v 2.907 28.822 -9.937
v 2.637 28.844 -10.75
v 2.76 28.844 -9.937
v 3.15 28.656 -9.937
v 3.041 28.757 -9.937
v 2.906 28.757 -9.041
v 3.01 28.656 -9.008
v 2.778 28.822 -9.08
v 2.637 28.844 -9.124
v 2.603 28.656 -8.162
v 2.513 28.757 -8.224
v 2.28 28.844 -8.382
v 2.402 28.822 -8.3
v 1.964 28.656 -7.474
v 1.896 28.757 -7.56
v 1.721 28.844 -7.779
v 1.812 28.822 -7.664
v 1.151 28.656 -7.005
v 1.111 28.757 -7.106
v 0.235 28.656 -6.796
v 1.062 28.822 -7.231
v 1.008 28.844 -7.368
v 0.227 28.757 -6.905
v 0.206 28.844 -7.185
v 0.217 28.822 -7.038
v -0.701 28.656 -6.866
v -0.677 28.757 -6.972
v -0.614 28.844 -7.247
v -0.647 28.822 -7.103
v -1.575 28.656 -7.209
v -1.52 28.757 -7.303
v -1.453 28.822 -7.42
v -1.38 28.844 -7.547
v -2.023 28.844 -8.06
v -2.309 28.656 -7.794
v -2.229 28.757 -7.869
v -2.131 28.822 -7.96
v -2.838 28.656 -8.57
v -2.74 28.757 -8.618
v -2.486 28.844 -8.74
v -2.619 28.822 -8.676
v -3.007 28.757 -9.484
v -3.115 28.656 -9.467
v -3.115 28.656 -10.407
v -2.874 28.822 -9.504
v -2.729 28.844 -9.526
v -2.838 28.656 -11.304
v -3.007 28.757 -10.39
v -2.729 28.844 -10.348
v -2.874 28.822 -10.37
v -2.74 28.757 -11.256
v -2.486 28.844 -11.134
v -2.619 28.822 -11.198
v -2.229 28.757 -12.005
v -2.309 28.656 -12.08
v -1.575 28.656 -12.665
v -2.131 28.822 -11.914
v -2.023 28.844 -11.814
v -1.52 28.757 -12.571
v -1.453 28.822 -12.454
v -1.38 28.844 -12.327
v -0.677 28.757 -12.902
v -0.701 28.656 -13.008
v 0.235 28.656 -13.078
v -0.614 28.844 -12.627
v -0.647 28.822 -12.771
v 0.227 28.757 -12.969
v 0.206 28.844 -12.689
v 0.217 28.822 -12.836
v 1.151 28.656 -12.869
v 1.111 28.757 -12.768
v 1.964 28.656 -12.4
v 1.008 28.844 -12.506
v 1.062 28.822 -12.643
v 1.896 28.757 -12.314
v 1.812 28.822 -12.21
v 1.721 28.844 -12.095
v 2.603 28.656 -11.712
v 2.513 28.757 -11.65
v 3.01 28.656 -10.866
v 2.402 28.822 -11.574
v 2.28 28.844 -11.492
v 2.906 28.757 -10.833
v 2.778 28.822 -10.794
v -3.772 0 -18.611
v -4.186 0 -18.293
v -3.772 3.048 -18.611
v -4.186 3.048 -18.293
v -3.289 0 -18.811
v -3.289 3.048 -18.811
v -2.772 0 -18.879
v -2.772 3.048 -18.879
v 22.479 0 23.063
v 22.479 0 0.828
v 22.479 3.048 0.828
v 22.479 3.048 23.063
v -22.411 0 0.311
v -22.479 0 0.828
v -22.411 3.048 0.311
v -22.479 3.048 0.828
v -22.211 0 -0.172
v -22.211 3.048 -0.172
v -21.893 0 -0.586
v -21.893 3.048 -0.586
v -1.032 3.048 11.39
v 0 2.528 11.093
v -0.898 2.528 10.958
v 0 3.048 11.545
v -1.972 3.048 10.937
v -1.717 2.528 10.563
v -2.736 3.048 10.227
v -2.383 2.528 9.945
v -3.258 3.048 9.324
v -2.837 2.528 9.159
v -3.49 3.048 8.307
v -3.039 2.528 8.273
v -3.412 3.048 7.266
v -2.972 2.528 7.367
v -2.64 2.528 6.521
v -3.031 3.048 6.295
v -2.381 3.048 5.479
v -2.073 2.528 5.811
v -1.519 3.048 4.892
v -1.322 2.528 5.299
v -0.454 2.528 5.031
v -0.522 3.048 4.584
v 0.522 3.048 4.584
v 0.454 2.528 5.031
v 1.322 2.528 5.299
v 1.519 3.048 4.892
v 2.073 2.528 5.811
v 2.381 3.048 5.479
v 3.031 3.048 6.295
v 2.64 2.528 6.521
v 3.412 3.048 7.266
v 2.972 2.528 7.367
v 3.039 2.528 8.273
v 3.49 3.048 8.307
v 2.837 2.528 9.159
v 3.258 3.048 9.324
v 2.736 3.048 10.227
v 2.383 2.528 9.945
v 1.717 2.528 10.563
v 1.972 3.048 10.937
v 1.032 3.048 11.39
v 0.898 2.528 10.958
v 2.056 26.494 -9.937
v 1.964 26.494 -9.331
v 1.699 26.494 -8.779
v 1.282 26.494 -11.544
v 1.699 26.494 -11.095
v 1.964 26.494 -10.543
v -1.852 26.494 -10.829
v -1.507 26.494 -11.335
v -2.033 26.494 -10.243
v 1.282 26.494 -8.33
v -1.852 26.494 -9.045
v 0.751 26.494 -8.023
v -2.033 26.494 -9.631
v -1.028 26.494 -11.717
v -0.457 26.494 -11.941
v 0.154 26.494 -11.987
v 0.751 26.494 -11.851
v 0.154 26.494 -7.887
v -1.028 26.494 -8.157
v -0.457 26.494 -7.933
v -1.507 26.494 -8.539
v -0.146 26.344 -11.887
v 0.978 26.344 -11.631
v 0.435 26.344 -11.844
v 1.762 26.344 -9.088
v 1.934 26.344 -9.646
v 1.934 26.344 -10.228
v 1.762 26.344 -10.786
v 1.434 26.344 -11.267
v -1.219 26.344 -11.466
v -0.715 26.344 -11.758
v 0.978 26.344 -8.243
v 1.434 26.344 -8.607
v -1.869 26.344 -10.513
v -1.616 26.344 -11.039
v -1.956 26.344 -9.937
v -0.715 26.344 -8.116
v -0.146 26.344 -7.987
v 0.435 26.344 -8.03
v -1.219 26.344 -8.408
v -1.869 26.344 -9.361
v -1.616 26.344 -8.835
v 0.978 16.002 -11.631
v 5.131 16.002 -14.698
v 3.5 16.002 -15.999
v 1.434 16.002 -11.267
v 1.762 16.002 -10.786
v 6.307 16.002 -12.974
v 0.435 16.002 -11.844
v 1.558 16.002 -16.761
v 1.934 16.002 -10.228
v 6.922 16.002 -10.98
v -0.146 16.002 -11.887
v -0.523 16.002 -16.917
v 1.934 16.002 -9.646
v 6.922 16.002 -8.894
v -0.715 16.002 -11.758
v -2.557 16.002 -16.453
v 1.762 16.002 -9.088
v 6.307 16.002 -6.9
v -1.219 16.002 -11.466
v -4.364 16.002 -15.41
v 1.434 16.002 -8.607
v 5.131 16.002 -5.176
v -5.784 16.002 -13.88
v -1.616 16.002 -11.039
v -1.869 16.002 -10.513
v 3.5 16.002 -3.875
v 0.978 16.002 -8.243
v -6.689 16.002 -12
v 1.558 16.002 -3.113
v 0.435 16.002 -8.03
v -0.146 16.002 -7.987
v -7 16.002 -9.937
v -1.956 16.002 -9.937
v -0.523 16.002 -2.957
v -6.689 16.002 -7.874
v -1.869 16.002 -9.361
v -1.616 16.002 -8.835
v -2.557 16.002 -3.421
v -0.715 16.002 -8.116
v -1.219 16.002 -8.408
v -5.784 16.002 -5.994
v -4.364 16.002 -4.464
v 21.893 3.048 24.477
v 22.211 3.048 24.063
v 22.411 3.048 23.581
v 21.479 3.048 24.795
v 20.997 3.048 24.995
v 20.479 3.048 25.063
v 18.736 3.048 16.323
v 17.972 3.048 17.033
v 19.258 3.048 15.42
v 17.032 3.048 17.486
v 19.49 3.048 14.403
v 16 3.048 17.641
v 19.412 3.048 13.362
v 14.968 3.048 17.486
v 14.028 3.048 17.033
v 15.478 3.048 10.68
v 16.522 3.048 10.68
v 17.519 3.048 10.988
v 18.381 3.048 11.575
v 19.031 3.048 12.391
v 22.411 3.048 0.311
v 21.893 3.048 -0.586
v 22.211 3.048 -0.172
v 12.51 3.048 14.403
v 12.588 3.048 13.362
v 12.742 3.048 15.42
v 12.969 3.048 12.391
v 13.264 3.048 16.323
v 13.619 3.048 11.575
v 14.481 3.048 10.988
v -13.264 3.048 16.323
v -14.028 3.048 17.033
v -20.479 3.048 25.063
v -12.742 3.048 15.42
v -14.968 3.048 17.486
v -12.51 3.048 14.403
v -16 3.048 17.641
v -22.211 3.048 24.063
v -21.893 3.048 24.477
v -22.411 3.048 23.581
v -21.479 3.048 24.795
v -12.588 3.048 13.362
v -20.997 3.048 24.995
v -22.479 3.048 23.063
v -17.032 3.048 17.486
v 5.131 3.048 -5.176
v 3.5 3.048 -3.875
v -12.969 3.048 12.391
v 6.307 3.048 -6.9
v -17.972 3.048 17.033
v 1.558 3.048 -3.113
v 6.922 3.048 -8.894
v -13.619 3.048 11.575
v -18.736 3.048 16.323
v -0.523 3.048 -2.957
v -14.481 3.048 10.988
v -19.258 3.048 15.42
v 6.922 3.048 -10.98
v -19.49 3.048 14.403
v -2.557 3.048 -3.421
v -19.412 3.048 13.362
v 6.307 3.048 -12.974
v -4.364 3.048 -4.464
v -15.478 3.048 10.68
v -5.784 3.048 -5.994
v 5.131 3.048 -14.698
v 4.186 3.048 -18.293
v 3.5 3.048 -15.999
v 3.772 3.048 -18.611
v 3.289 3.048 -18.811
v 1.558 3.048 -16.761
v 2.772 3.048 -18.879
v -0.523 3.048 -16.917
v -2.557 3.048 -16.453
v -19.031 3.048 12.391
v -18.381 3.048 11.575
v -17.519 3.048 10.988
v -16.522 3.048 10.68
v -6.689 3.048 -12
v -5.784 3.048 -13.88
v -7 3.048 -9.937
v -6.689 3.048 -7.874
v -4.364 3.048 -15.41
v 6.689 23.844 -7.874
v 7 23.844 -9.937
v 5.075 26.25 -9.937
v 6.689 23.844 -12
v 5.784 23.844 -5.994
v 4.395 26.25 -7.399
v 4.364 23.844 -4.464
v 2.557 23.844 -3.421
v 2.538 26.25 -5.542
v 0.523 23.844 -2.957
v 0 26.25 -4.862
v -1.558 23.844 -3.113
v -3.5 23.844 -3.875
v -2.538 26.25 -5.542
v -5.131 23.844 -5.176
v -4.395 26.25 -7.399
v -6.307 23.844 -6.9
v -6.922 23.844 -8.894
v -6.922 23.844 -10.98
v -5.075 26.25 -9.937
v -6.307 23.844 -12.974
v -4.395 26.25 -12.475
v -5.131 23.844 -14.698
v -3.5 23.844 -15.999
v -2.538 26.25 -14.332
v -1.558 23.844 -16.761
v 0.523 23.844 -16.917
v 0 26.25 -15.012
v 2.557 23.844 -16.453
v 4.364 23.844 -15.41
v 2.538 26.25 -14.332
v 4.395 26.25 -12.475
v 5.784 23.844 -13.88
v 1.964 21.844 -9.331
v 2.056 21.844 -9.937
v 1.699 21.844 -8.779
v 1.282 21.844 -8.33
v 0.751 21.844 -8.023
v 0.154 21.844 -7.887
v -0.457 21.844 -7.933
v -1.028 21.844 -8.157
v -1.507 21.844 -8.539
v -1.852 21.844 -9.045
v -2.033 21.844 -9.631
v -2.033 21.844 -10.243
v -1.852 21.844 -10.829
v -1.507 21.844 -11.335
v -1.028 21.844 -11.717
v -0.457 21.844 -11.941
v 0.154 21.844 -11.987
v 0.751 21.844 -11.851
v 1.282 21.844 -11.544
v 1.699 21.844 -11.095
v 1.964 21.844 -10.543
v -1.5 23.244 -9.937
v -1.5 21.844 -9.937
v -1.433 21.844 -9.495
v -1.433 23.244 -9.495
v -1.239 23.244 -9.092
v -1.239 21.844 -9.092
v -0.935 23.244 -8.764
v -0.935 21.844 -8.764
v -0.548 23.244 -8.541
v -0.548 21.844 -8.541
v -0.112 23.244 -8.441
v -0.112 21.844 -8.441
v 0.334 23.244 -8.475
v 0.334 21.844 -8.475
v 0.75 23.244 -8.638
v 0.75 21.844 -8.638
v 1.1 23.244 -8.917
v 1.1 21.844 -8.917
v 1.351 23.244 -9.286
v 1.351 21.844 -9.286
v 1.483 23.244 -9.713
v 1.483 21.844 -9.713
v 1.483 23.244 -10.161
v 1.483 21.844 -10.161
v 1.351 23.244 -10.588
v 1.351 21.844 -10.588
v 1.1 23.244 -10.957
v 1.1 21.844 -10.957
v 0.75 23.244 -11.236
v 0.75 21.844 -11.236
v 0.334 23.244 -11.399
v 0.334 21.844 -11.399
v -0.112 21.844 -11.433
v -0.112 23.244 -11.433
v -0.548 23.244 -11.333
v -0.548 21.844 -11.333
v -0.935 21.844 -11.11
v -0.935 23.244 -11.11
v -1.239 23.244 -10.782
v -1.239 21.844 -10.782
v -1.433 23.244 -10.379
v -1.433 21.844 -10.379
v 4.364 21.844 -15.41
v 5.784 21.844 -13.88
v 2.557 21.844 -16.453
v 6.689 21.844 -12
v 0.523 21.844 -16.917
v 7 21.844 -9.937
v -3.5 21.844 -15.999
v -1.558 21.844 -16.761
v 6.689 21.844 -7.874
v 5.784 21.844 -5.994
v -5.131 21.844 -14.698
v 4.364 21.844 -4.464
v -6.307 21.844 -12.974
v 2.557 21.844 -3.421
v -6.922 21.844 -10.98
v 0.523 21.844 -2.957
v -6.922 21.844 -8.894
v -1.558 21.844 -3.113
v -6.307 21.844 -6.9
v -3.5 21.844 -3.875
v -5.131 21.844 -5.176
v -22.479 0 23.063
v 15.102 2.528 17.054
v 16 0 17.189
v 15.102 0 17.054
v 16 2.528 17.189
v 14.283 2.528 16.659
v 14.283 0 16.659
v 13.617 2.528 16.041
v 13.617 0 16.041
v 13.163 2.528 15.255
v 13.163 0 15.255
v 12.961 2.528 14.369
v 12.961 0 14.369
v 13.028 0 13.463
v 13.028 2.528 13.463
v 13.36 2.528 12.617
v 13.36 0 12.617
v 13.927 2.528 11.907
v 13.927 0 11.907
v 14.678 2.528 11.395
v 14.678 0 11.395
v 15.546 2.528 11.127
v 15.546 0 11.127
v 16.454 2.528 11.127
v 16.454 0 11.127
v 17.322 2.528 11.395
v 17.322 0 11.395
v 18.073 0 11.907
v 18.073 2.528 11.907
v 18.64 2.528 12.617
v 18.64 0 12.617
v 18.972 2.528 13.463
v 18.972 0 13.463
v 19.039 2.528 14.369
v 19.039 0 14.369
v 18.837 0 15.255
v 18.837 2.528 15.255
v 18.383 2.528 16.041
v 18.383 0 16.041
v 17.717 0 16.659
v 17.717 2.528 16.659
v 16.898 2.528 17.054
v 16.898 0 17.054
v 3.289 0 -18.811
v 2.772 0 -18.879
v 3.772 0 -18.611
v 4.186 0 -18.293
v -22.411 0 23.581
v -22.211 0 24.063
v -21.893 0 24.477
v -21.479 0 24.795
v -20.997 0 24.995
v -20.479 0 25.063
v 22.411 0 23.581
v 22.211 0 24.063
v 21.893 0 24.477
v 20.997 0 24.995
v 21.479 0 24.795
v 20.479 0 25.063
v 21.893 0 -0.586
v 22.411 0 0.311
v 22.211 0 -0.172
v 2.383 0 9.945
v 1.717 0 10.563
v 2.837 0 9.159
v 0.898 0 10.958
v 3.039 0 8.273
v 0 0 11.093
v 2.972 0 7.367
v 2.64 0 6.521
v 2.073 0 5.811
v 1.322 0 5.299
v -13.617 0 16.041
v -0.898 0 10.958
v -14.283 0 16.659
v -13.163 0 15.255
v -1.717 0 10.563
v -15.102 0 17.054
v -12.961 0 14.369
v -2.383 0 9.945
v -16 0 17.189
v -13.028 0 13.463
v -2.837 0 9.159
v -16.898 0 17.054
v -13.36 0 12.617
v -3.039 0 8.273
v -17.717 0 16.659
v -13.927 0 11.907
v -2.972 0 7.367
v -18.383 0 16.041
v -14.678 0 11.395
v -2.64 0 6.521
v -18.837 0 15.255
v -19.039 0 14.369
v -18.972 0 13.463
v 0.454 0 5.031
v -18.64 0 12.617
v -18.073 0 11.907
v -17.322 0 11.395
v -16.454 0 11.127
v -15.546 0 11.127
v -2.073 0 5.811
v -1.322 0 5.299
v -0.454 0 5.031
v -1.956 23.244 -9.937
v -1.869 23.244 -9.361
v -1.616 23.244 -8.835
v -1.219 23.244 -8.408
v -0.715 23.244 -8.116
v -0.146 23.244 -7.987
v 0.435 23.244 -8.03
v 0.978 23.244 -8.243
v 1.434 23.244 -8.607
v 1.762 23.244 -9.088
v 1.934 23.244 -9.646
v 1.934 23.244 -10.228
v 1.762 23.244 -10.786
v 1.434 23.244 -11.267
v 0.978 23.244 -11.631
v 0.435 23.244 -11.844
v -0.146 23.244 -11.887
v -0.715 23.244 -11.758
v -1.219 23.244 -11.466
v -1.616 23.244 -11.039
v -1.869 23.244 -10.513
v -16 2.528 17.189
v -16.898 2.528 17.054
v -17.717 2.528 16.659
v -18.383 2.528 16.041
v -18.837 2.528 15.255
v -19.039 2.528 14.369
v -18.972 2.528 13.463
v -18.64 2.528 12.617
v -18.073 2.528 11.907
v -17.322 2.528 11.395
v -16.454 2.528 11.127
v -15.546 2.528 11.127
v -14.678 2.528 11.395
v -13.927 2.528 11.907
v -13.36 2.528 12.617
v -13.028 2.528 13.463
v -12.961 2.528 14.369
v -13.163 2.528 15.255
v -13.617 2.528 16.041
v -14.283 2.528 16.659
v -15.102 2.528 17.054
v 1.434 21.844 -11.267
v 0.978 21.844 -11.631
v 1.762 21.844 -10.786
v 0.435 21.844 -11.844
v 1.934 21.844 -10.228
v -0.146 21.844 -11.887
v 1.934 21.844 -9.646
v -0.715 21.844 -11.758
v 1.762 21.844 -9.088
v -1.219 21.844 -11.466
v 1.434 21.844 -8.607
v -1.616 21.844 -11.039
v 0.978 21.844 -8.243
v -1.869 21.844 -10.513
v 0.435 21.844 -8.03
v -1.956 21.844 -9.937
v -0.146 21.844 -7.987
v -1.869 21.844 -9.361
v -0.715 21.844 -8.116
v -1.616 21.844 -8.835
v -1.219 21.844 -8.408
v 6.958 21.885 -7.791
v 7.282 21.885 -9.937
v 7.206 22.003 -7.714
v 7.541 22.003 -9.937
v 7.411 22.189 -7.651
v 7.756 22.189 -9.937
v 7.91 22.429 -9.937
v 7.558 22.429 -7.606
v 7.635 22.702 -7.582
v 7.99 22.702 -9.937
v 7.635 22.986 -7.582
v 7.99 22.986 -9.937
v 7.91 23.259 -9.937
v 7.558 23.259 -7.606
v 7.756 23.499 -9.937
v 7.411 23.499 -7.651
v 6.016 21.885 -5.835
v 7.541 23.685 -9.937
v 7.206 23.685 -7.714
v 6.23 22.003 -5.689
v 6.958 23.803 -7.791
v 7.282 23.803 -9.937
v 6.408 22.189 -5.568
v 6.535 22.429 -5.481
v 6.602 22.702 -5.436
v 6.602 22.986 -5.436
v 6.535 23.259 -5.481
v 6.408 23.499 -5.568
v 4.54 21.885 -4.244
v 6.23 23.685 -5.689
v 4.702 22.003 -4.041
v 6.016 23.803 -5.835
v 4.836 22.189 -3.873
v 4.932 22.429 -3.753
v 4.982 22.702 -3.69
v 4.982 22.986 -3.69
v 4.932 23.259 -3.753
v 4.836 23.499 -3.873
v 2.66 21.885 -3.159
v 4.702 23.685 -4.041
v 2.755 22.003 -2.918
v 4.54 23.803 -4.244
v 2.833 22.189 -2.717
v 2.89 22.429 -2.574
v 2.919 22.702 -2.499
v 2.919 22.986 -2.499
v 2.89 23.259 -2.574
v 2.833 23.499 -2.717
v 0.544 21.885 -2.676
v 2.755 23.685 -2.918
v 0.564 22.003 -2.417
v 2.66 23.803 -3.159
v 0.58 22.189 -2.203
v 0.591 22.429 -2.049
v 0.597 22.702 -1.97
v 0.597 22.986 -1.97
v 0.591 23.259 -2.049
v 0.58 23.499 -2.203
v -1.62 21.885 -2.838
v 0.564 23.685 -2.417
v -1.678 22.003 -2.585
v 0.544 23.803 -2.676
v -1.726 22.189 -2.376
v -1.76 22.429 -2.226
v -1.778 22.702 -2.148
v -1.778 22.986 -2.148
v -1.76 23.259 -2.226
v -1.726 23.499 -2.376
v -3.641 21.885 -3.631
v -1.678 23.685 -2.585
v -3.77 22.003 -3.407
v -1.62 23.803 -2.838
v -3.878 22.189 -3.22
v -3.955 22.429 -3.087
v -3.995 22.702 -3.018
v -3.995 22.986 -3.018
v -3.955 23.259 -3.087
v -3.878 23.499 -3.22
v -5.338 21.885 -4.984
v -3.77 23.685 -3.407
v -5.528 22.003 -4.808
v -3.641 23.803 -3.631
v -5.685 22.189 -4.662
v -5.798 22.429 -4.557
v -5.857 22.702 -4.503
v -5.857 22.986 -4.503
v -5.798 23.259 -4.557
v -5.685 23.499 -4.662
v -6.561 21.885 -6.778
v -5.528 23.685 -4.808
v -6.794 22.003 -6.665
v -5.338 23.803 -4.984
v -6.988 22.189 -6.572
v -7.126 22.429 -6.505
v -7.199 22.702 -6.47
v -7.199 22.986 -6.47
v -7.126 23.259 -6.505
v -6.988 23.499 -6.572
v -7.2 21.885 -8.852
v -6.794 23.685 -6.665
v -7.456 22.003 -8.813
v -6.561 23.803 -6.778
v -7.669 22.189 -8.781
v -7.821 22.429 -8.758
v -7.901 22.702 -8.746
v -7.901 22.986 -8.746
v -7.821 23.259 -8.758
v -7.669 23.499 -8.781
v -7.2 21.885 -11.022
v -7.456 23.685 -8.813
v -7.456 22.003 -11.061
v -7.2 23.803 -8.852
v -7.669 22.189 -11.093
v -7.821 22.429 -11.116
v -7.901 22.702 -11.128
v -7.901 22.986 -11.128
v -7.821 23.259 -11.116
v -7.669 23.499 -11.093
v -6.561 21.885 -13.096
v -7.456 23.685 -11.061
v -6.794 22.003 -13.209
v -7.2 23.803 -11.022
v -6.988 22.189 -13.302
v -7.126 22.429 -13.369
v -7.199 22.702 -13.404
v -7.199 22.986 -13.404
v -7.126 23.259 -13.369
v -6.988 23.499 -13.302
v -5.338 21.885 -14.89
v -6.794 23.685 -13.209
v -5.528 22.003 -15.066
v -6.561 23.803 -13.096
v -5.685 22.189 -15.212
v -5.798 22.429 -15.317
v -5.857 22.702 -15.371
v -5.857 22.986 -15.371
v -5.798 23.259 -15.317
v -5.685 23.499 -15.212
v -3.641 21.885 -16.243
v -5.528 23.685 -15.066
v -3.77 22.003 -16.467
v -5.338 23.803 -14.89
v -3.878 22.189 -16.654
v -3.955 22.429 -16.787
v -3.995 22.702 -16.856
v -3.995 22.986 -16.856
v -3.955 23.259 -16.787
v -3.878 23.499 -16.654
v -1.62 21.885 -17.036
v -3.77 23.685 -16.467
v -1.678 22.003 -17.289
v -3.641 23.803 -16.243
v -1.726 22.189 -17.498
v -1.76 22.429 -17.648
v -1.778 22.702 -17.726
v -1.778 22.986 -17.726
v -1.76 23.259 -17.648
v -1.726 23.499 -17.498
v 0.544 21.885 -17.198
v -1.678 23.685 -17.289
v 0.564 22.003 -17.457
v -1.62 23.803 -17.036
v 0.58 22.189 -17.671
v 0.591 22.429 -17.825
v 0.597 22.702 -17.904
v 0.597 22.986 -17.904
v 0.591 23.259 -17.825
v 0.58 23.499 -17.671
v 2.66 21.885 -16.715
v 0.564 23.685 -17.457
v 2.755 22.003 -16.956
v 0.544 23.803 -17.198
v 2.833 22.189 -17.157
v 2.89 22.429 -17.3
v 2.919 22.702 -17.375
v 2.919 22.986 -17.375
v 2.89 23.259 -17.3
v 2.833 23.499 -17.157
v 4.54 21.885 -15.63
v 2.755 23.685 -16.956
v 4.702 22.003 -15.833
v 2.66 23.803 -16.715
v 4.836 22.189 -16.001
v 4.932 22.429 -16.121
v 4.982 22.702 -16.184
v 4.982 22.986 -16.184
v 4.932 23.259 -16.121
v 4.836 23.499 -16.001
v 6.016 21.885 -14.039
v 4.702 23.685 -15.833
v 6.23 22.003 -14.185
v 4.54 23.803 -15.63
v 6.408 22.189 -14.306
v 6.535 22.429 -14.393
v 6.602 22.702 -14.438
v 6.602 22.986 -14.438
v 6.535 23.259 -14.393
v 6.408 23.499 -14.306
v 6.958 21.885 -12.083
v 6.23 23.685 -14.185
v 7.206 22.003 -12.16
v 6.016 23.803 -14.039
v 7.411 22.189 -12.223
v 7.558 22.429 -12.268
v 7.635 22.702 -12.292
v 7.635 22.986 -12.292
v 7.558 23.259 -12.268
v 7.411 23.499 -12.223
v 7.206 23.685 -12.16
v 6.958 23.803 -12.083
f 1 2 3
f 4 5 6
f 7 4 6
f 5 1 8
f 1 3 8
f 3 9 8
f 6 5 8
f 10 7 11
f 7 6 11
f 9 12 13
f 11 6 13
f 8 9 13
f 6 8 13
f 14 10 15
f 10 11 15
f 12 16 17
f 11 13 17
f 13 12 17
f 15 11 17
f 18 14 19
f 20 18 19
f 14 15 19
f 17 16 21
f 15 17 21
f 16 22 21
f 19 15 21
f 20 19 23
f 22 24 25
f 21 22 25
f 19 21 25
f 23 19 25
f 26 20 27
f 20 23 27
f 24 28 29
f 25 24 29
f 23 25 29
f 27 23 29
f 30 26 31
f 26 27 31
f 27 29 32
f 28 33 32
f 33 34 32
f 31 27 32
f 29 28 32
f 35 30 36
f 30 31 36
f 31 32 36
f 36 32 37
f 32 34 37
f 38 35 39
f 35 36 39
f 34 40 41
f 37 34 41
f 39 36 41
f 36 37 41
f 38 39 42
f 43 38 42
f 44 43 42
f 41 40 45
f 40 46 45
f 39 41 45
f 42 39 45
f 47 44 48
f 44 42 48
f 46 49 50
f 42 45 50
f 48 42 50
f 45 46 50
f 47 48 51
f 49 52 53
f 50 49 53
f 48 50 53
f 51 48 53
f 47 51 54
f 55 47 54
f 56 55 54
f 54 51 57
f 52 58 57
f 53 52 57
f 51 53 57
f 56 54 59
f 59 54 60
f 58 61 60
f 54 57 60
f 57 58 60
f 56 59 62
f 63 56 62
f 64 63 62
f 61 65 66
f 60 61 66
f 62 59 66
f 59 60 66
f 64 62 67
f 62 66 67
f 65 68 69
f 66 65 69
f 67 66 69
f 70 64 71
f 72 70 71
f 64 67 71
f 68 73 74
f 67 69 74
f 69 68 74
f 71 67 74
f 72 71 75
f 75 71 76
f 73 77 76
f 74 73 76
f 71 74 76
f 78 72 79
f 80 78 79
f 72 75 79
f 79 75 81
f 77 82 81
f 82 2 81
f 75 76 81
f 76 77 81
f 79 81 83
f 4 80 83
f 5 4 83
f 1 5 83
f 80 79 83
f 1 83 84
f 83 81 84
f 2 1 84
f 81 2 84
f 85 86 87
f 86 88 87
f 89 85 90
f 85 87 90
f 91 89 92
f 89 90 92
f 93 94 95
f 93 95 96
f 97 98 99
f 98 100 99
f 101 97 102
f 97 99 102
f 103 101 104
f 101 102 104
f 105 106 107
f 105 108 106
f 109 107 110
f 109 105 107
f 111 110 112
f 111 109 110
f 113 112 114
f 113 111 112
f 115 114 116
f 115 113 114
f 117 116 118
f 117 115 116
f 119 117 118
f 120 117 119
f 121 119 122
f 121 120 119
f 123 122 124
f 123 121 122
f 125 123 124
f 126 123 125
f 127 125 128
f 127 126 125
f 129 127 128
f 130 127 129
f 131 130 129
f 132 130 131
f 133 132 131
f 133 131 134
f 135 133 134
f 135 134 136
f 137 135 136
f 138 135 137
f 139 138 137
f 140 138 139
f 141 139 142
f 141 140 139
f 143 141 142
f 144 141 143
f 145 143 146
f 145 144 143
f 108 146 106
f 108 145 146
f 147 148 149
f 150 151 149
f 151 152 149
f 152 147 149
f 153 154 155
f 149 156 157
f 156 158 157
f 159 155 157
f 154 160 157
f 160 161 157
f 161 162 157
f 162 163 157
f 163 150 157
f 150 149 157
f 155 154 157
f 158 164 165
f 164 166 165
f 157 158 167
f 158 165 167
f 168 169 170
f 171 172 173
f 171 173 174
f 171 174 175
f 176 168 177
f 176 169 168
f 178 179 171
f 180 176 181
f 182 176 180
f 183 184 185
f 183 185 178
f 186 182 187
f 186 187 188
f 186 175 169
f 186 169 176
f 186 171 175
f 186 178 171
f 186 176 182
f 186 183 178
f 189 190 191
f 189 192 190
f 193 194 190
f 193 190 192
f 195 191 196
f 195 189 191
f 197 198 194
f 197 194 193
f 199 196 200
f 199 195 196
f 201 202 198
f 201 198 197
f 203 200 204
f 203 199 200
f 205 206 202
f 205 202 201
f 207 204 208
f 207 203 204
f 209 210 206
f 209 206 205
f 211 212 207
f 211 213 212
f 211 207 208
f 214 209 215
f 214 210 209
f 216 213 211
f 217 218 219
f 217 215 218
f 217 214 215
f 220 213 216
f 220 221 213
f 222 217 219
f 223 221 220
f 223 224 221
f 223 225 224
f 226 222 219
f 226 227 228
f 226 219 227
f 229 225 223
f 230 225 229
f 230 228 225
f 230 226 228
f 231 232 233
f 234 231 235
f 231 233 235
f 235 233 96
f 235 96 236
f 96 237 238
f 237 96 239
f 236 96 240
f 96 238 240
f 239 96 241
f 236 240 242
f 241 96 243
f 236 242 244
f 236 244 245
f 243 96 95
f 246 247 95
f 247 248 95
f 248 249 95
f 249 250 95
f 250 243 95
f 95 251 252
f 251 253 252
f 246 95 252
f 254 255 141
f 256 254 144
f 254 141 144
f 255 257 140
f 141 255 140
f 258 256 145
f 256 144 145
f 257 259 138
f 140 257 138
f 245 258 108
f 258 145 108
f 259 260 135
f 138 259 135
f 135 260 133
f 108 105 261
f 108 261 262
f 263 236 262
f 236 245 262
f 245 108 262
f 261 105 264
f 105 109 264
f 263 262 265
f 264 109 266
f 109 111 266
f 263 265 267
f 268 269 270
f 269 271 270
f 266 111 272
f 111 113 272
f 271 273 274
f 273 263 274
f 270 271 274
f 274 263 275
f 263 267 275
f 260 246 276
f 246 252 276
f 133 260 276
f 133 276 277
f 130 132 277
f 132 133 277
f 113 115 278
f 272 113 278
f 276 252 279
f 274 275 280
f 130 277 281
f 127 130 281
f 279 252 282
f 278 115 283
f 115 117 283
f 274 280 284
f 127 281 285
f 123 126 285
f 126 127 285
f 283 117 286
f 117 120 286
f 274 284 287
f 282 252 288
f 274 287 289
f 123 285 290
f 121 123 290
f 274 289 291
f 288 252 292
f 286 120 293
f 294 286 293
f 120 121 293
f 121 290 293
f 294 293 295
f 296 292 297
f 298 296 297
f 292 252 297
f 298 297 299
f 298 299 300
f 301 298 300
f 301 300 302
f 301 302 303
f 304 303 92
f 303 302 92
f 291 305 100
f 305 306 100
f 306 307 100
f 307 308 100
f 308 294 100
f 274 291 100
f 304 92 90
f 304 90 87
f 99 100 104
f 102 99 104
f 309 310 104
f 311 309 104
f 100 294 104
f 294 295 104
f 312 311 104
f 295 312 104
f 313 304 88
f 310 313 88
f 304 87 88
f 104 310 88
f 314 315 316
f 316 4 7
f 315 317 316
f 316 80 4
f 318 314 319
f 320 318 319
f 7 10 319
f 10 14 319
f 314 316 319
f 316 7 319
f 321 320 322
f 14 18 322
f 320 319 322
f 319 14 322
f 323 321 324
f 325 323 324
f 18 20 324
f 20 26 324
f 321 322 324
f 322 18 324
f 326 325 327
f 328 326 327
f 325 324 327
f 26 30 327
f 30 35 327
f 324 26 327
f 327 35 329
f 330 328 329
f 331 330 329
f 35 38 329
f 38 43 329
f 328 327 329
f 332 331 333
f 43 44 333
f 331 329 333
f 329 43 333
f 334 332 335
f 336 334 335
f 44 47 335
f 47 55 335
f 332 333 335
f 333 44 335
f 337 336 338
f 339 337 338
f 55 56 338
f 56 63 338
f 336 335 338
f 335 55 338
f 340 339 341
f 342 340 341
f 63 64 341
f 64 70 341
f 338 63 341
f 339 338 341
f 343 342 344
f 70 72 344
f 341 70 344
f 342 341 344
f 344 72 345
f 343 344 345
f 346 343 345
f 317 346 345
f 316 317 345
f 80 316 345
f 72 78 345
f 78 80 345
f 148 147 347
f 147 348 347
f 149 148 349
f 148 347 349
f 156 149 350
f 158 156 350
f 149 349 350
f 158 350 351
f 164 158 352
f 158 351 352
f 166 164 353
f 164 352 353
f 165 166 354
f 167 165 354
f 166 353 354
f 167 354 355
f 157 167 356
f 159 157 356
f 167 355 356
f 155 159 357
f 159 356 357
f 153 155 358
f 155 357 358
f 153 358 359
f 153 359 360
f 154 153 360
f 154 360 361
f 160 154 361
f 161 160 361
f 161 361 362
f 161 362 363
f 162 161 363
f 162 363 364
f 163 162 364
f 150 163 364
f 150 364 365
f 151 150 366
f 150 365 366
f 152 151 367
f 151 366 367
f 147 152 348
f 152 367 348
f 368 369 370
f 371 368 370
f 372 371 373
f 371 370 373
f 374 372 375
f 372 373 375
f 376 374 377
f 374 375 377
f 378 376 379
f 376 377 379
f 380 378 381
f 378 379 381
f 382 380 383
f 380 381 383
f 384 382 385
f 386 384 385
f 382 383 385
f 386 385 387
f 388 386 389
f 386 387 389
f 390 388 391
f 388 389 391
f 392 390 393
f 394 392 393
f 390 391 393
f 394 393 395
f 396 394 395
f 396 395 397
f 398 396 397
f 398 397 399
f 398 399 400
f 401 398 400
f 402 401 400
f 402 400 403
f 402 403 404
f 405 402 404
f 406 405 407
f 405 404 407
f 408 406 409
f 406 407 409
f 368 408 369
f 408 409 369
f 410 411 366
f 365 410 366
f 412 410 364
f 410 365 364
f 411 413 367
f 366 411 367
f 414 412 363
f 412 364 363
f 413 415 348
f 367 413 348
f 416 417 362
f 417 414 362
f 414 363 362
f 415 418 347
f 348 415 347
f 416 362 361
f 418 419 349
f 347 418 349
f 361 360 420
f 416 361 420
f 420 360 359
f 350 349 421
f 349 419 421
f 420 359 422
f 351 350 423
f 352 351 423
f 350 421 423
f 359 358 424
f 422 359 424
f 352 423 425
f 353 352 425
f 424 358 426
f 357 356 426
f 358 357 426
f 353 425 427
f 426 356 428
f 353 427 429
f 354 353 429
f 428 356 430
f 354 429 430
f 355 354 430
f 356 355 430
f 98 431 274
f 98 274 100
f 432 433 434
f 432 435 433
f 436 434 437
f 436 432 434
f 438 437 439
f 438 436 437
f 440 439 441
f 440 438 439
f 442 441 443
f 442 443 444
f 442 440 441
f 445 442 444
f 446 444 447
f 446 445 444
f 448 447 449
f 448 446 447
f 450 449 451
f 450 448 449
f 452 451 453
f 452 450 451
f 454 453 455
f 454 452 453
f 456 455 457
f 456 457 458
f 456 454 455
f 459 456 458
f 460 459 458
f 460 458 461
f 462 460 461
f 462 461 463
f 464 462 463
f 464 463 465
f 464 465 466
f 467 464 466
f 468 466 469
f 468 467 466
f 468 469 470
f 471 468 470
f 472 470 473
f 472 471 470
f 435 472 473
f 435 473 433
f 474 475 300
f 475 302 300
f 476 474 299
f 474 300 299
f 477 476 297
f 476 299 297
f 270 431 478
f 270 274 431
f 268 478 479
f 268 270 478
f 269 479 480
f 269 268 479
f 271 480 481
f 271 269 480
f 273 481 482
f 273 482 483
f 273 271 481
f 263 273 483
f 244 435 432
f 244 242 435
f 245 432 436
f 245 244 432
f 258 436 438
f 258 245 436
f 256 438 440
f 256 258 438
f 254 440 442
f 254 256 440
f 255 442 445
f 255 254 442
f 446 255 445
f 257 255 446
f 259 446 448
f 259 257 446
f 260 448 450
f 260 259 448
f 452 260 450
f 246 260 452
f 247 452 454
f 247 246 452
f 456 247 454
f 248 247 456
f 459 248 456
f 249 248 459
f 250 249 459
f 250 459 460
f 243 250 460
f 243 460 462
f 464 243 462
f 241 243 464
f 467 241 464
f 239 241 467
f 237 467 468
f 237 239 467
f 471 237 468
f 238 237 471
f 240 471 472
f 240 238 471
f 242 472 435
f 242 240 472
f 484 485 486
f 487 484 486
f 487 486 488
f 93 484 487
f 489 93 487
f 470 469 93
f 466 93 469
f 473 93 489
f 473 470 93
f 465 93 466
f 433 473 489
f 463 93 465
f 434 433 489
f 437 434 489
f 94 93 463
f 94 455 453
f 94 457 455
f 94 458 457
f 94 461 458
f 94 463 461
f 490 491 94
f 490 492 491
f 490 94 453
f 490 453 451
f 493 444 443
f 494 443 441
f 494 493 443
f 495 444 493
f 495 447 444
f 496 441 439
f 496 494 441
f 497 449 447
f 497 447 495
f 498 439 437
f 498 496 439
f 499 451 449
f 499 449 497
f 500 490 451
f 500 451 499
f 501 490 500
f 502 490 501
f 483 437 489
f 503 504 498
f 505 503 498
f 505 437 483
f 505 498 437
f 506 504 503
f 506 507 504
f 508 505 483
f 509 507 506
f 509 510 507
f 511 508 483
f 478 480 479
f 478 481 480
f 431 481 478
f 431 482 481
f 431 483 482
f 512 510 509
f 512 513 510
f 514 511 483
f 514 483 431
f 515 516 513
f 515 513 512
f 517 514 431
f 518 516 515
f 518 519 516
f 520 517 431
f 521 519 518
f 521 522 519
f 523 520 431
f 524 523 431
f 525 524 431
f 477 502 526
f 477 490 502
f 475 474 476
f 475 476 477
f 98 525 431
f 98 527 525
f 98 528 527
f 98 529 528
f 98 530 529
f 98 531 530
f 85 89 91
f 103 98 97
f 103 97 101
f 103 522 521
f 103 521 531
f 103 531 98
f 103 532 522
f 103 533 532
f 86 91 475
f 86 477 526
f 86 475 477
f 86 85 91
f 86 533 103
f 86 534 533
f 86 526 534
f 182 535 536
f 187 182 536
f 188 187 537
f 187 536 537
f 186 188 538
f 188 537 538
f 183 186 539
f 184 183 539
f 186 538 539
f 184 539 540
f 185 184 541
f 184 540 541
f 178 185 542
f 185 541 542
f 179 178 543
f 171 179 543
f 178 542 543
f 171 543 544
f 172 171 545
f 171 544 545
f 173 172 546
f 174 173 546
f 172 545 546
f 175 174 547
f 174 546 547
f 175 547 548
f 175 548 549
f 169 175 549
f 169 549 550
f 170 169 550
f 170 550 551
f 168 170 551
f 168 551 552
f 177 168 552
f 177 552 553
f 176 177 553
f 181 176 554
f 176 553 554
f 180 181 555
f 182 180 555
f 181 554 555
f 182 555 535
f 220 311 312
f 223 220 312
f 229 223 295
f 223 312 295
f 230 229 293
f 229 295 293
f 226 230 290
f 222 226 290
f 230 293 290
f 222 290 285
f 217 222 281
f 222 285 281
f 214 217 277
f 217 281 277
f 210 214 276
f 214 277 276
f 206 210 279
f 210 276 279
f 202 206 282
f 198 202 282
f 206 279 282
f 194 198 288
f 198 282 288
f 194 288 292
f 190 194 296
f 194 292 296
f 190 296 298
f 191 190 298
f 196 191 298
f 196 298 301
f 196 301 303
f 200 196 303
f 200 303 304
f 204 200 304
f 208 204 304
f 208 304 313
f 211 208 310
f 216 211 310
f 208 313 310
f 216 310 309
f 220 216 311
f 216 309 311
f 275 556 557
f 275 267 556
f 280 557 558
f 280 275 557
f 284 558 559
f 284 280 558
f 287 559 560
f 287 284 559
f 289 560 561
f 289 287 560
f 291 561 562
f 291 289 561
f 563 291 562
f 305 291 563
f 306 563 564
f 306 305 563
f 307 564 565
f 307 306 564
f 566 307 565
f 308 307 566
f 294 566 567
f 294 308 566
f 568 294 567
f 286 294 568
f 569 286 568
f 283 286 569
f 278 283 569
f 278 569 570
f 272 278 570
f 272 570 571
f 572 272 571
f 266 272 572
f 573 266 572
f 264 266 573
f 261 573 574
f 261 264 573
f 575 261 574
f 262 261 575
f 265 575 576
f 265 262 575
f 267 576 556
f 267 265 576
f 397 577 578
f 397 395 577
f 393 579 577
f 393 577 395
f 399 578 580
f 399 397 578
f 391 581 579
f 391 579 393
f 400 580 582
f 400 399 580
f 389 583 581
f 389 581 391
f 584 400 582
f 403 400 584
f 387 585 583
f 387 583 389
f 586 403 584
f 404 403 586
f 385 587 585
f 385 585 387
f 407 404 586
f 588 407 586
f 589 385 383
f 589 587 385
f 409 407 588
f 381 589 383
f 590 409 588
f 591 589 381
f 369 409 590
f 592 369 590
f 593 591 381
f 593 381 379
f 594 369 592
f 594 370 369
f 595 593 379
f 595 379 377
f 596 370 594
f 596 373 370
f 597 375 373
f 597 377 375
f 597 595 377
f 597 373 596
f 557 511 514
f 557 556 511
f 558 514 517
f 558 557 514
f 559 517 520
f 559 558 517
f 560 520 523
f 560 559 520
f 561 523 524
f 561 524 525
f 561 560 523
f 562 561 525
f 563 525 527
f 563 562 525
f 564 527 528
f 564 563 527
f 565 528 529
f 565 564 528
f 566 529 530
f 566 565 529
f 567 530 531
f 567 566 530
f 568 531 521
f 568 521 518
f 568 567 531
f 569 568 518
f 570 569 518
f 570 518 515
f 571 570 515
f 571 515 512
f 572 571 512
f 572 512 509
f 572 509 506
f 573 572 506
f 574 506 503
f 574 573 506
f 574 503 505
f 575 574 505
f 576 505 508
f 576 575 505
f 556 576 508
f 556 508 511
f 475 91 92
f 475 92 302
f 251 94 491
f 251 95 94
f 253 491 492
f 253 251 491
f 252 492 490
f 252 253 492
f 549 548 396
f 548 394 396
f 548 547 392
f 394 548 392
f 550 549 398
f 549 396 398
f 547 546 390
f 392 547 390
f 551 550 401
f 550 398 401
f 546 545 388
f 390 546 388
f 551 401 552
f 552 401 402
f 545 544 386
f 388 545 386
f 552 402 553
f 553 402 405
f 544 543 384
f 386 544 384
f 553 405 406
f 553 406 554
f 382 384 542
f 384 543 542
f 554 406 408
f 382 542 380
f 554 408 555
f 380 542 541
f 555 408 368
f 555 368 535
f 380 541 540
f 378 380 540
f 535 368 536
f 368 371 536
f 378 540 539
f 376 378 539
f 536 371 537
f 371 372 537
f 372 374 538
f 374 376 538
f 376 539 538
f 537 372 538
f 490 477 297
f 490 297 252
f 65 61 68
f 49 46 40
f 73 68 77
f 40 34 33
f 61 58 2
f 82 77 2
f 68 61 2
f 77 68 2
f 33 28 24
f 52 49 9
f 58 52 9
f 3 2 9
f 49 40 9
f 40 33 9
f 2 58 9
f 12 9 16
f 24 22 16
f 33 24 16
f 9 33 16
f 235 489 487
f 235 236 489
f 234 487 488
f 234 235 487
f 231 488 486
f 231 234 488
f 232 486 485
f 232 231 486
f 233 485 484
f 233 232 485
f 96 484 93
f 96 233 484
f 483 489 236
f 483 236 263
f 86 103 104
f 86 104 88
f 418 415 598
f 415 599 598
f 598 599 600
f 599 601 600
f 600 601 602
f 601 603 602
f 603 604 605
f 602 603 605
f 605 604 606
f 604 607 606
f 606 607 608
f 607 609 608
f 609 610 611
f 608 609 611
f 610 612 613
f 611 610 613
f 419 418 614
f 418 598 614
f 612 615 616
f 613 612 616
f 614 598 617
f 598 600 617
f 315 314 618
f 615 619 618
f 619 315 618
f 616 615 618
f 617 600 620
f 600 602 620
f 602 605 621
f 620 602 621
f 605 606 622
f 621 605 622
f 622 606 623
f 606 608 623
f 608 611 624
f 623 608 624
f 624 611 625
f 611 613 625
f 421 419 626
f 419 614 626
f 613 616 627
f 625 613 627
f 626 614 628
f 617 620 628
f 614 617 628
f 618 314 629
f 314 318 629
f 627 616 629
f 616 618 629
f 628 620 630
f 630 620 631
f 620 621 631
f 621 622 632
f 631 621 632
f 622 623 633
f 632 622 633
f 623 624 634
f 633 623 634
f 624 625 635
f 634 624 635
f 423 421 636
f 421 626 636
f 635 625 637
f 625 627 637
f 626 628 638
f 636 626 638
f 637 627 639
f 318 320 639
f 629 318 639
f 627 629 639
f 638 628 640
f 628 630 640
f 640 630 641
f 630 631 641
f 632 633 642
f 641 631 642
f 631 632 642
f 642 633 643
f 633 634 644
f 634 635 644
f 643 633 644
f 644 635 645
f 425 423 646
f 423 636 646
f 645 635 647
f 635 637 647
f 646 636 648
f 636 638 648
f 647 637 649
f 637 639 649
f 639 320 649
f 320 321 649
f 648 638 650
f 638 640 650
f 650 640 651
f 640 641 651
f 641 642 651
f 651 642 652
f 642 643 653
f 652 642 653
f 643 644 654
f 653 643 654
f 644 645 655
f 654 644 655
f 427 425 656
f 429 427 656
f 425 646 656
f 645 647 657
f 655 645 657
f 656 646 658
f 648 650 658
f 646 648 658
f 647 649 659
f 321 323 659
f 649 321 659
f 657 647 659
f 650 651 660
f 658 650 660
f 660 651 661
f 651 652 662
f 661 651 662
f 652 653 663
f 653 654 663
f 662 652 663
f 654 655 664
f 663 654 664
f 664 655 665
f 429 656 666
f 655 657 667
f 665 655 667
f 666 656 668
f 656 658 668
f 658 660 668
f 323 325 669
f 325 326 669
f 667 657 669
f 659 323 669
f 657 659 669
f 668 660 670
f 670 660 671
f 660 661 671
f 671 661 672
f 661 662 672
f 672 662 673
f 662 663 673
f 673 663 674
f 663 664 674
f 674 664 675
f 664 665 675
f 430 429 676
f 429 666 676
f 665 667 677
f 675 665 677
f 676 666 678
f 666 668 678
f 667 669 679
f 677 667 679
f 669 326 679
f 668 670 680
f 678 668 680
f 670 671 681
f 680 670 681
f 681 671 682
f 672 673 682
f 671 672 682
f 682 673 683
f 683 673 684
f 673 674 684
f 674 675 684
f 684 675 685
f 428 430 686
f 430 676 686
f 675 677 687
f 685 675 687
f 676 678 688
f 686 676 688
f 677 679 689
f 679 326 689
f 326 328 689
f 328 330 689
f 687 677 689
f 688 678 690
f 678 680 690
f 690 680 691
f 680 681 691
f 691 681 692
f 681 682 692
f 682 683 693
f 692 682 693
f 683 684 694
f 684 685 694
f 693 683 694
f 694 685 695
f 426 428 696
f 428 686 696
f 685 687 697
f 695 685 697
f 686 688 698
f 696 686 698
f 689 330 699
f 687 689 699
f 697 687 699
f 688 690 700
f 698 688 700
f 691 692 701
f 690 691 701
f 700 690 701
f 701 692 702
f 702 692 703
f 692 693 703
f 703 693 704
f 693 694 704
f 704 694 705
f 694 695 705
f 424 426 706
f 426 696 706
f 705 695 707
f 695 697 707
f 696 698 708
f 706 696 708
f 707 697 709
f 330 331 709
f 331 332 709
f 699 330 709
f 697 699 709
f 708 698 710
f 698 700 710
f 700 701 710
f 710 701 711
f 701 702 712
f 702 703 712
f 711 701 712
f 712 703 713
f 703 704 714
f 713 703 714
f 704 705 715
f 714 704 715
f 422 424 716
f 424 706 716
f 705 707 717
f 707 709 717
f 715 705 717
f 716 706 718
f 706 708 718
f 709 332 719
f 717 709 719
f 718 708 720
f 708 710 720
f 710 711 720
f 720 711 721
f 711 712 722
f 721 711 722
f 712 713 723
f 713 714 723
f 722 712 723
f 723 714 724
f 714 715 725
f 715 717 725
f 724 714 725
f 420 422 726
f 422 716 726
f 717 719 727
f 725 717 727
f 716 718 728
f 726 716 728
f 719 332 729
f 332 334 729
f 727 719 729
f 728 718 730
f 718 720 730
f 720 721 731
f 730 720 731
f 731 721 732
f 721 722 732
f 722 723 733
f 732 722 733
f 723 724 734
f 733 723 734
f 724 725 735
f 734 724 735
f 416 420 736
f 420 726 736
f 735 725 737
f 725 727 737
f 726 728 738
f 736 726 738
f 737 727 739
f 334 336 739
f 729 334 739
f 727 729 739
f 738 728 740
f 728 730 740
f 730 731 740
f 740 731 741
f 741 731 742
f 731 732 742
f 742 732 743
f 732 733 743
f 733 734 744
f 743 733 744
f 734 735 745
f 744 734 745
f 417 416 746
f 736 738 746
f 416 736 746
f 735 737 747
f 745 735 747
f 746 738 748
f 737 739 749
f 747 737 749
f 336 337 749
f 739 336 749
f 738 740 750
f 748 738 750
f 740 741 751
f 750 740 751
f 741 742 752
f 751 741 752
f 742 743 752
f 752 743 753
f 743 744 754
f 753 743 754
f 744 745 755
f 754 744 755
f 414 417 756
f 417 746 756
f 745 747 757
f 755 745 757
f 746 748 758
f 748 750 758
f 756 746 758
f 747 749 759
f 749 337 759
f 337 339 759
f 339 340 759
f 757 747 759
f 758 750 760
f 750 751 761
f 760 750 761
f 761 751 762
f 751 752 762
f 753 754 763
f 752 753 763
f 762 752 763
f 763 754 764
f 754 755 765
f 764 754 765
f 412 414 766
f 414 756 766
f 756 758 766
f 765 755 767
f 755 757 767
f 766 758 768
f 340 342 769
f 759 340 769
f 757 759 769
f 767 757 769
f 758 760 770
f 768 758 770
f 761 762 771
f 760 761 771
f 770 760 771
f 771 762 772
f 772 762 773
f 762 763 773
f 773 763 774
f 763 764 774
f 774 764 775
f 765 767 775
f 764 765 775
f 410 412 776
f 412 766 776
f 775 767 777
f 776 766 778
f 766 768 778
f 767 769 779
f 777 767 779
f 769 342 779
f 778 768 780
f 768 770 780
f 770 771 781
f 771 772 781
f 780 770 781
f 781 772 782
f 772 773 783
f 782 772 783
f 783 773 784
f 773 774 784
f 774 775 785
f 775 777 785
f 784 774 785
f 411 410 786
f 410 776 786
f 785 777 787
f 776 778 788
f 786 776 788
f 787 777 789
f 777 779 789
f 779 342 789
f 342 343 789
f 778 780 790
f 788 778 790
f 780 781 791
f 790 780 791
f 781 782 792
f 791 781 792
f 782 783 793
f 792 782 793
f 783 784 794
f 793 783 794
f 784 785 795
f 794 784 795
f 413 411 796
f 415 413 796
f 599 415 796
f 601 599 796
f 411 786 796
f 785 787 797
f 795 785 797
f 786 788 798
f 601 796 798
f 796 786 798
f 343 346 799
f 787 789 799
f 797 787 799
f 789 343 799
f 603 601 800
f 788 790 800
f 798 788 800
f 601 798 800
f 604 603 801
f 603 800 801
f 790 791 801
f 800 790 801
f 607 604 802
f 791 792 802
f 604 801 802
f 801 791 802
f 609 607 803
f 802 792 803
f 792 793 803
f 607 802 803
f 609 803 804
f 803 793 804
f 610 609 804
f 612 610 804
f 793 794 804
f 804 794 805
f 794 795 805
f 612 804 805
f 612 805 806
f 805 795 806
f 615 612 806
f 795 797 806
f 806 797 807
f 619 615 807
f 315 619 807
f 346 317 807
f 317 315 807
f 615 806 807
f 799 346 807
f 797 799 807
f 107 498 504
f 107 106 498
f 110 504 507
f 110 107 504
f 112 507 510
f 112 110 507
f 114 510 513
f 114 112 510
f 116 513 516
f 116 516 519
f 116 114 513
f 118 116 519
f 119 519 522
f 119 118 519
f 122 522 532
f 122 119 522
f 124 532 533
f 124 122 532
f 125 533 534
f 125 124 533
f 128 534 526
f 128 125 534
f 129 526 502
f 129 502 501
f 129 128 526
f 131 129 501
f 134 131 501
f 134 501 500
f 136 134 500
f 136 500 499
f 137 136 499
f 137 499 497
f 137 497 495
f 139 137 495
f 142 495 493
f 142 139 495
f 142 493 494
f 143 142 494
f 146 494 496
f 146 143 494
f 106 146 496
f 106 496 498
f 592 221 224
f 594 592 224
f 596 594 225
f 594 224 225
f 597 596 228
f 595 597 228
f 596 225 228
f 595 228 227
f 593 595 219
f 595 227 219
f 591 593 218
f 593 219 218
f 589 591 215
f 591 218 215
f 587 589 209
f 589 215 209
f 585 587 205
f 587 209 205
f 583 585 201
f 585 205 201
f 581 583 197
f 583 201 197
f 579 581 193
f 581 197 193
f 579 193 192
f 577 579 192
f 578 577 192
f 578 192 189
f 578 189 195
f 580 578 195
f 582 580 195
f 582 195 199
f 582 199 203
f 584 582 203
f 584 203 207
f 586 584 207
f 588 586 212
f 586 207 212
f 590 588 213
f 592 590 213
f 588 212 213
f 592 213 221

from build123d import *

# Parameters (mm, degrees)
EXTRUDE1_DEPTH   = 3.048
HOLE1_AT_2_COUNT = 2
HOLE1_AT_2_PITCH = 17.121951291
HOLE1_AT_3_COUNT = 2
HOLE1_AT_3_PITCH = 17.121951291
SKETCH4_R        = 7
EXTRUDE2_DEPTH   = 12.954
SKETCH5_R        = 1.9558
EXTRUDE3_DEPTH   = 5.842
SKETCH6_R        = 1.5
EXTRUDE4_DEPTH   = 1.4
SKETCH7_R        = 1.9558
EXTRUDE6_DEPTH   = 3.1
FILLET1_R        = 0.5
FILLET2_R        = 2


with BuildPart() as part:
    # Sketch1 → Extrude1 (new body)
    with BuildSketch(Plane(origin=(0, 0, 0), x_dir=(1, 0, 0), z_dir=(0, 1, 0))):
        Polygon((-22.479, -25.063), (-22.479, 0), (-3.6, 18.879), (3.6, 18.879), (22.479, 0), (22.479, -25.063), align=None)
    extrude(amount=EXTRUDE1_DEPTH)

    # Sketch2 → Hole1 (revolve, cut)
    with BuildSketch(Plane(origin=(0, 3.048, 8.045), x_dir=(0, 0, 1), z_dir=(1, 0, 0))):
        Polygon((0, 0), (0, 3.048), (3.048, 3.048), (3.048, 0.51996652), (3.5, 0), align=None)
    hole1 = revolve(axis=Axis((0, 9.493314094, 8.045), (0, -1, 0)), mode=Mode.SUBTRACT)

    # Hole1 at 2: Hole1 ×2
    with Locations(*[Vector(0.934472931, 0, 0.356034187) * (i * HOLE1_AT_2_PITCH) for i in range(1, HOLE1_AT_2_COUNT)]):
        add(hole1, mode=Mode.SUBTRACT)

    # Hole1 at 3: Hole1 ×2
    with Locations(*[Vector(-0.934472931, 0, 0.356034187) * (i * HOLE1_AT_3_PITCH) for i in range(1, HOLE1_AT_3_COUNT)]):
        add(hole1, mode=Mode.SUBTRACT)

    # Sketch4 → Extrude2 (add)
    with BuildSketch(Plane(origin=(0, 3.048, 0), x_dir=(-1, 0, 0), z_dir=(0, 1, 0))):
        with Locations((0, -9.937)):
            Circle(SKETCH4_R)
    extrude(amount=EXTRUDE2_DEPTH)

    # Sketch5 → Extrude3 (add)
    with BuildSketch(Plane(origin=(0, 16.002, 0), x_dir=(-1, 0, 0), z_dir=(0, 1, 0))):
        with Locations((0, -9.937)):
            Circle(SKETCH5_R)
    extrude(amount=EXTRUDE3_DEPTH)

    # Sketch6 → Extrude4 (add)
    with BuildSketch(Plane(origin=(0, 21.844, 0), x_dir=(-1, 0, 0), z_dir=(0, 1, 0))):
        with Locations((0, -9.937)):
            Circle(SKETCH6_R)
    extrude(amount=EXTRUDE4_DEPTH)

    # Sketch7 → Extrude6 (add)
    with BuildSketch(Plane(origin=(0, 23.244, 0), x_dir=(-1, 0, 0), z_dir=(0, 1, 0))):
        with Locations((0, -9.937)):
            Circle(SKETCH7_R)
    extrude(amount=EXTRUDE6_DEPTH)

    # Fillet2
    fillet2_edges = [part.edges().sort_by_distance(p)[0] for p in [
        (-22.479, 1.524, 25.063),
        (-22.479, 1.524, 0),
        (-3.6, 1.524, -18.879),
        (3.6, 1.524, -18.879),
        (22.479, 1.524, 0),
        (22.479, 1.524, 25.063),
    ]]
    fillet(fillet2_edges, radius=FILLET2_R)


with BuildPart() as body_2:
    # Sketch8 → Revolve1 (revolve)
    with BuildSketch(Plane.XY.offset(-9.937)):
        with BuildLine():
            Line((7, 23.844), (3, 28.844))
            Line((3, 28.844), (0, 28.844))
            Line((0, 28.844), (0, 26.494))
            Line((0, 26.494), (2.0558, 26.494))
            Line((2.0558, 26.494), (2.0558, 21.844))
            Line((2.0558, 21.844), (7, 21.844))
            ThreePointArc((7, 21.844), (8, 22.844), (7, 23.844))
        make_face()
    revolve(axis=Axis((0, 21.844, -9.937), (0, -1, 0)))

    # Fillet1
    fillet1_edges = [body_2.edges().sort_by_distance(p)[0] for p in [
        (-3, 28.844, -9.937),
    ]]
    fillet(fillet1_edges, radius=FILLET1_R)


solid = Compound([part.part, body_2.part])
